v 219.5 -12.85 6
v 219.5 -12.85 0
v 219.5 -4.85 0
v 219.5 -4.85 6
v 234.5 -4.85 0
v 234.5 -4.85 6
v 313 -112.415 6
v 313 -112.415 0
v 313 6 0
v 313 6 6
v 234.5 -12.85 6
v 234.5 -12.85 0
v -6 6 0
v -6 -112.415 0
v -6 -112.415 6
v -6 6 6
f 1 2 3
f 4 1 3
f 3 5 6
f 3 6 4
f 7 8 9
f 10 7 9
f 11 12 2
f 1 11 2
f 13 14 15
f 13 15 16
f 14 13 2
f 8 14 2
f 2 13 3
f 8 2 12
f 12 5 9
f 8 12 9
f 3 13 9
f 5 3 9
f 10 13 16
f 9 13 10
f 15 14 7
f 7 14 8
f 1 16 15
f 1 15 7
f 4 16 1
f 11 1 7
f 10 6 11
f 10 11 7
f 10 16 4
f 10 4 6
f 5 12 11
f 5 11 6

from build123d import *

# Parameters (mm, degrees)
ESQUISSE1_W             = 319
ESQUISSE1_H             = 118.414906094
BOSS_EXTRU_1_DEPTH      = 6
ENL_V_MAT_EXTRU_1_REACH = 334.629
ESQUISSE2_W             = 15
ESQUISSE2_H             = 8


with BuildPart() as part:
    # Esquisse1 → Boss.-Extru.1 (new body)
    with BuildSketch(Plane.XY):
        with Locations((153.5, -53.207453047)):
            Rectangle(ESQUISSE1_W, ESQUISSE1_H)
    extrude(amount=BOSS_EXTRU_1_DEPTH)

    # Esquisse2 → Enlèv. mat.-Extru.1 (cut, up to next)
    with BuildSketch(Plane(origin=(0, 0, 0), x_dir=(-1, 0, 0), z_dir=(0, 0, -1)), mode=Mode.PRIVATE) as enl_v_mat_extru_1_sk1:
        with Locations((-227, -8.85)):
            Rectangle(ESQUISSE2_W, ESQUISSE2_H)
    enl_v_mat_extru_1_tool1 = extrude(enl_v_mat_extru_1_sk1.sketch, amount=-ENL_V_MAT_EXTRU_1_REACH, mode=Mode.PRIVATE) & part.part
    add(enl_v_mat_extru_1_tool1.solids().sort_by_distance((227, -8.85, 0))[0], mode=Mode.SUBTRACT)


solid = part.part
